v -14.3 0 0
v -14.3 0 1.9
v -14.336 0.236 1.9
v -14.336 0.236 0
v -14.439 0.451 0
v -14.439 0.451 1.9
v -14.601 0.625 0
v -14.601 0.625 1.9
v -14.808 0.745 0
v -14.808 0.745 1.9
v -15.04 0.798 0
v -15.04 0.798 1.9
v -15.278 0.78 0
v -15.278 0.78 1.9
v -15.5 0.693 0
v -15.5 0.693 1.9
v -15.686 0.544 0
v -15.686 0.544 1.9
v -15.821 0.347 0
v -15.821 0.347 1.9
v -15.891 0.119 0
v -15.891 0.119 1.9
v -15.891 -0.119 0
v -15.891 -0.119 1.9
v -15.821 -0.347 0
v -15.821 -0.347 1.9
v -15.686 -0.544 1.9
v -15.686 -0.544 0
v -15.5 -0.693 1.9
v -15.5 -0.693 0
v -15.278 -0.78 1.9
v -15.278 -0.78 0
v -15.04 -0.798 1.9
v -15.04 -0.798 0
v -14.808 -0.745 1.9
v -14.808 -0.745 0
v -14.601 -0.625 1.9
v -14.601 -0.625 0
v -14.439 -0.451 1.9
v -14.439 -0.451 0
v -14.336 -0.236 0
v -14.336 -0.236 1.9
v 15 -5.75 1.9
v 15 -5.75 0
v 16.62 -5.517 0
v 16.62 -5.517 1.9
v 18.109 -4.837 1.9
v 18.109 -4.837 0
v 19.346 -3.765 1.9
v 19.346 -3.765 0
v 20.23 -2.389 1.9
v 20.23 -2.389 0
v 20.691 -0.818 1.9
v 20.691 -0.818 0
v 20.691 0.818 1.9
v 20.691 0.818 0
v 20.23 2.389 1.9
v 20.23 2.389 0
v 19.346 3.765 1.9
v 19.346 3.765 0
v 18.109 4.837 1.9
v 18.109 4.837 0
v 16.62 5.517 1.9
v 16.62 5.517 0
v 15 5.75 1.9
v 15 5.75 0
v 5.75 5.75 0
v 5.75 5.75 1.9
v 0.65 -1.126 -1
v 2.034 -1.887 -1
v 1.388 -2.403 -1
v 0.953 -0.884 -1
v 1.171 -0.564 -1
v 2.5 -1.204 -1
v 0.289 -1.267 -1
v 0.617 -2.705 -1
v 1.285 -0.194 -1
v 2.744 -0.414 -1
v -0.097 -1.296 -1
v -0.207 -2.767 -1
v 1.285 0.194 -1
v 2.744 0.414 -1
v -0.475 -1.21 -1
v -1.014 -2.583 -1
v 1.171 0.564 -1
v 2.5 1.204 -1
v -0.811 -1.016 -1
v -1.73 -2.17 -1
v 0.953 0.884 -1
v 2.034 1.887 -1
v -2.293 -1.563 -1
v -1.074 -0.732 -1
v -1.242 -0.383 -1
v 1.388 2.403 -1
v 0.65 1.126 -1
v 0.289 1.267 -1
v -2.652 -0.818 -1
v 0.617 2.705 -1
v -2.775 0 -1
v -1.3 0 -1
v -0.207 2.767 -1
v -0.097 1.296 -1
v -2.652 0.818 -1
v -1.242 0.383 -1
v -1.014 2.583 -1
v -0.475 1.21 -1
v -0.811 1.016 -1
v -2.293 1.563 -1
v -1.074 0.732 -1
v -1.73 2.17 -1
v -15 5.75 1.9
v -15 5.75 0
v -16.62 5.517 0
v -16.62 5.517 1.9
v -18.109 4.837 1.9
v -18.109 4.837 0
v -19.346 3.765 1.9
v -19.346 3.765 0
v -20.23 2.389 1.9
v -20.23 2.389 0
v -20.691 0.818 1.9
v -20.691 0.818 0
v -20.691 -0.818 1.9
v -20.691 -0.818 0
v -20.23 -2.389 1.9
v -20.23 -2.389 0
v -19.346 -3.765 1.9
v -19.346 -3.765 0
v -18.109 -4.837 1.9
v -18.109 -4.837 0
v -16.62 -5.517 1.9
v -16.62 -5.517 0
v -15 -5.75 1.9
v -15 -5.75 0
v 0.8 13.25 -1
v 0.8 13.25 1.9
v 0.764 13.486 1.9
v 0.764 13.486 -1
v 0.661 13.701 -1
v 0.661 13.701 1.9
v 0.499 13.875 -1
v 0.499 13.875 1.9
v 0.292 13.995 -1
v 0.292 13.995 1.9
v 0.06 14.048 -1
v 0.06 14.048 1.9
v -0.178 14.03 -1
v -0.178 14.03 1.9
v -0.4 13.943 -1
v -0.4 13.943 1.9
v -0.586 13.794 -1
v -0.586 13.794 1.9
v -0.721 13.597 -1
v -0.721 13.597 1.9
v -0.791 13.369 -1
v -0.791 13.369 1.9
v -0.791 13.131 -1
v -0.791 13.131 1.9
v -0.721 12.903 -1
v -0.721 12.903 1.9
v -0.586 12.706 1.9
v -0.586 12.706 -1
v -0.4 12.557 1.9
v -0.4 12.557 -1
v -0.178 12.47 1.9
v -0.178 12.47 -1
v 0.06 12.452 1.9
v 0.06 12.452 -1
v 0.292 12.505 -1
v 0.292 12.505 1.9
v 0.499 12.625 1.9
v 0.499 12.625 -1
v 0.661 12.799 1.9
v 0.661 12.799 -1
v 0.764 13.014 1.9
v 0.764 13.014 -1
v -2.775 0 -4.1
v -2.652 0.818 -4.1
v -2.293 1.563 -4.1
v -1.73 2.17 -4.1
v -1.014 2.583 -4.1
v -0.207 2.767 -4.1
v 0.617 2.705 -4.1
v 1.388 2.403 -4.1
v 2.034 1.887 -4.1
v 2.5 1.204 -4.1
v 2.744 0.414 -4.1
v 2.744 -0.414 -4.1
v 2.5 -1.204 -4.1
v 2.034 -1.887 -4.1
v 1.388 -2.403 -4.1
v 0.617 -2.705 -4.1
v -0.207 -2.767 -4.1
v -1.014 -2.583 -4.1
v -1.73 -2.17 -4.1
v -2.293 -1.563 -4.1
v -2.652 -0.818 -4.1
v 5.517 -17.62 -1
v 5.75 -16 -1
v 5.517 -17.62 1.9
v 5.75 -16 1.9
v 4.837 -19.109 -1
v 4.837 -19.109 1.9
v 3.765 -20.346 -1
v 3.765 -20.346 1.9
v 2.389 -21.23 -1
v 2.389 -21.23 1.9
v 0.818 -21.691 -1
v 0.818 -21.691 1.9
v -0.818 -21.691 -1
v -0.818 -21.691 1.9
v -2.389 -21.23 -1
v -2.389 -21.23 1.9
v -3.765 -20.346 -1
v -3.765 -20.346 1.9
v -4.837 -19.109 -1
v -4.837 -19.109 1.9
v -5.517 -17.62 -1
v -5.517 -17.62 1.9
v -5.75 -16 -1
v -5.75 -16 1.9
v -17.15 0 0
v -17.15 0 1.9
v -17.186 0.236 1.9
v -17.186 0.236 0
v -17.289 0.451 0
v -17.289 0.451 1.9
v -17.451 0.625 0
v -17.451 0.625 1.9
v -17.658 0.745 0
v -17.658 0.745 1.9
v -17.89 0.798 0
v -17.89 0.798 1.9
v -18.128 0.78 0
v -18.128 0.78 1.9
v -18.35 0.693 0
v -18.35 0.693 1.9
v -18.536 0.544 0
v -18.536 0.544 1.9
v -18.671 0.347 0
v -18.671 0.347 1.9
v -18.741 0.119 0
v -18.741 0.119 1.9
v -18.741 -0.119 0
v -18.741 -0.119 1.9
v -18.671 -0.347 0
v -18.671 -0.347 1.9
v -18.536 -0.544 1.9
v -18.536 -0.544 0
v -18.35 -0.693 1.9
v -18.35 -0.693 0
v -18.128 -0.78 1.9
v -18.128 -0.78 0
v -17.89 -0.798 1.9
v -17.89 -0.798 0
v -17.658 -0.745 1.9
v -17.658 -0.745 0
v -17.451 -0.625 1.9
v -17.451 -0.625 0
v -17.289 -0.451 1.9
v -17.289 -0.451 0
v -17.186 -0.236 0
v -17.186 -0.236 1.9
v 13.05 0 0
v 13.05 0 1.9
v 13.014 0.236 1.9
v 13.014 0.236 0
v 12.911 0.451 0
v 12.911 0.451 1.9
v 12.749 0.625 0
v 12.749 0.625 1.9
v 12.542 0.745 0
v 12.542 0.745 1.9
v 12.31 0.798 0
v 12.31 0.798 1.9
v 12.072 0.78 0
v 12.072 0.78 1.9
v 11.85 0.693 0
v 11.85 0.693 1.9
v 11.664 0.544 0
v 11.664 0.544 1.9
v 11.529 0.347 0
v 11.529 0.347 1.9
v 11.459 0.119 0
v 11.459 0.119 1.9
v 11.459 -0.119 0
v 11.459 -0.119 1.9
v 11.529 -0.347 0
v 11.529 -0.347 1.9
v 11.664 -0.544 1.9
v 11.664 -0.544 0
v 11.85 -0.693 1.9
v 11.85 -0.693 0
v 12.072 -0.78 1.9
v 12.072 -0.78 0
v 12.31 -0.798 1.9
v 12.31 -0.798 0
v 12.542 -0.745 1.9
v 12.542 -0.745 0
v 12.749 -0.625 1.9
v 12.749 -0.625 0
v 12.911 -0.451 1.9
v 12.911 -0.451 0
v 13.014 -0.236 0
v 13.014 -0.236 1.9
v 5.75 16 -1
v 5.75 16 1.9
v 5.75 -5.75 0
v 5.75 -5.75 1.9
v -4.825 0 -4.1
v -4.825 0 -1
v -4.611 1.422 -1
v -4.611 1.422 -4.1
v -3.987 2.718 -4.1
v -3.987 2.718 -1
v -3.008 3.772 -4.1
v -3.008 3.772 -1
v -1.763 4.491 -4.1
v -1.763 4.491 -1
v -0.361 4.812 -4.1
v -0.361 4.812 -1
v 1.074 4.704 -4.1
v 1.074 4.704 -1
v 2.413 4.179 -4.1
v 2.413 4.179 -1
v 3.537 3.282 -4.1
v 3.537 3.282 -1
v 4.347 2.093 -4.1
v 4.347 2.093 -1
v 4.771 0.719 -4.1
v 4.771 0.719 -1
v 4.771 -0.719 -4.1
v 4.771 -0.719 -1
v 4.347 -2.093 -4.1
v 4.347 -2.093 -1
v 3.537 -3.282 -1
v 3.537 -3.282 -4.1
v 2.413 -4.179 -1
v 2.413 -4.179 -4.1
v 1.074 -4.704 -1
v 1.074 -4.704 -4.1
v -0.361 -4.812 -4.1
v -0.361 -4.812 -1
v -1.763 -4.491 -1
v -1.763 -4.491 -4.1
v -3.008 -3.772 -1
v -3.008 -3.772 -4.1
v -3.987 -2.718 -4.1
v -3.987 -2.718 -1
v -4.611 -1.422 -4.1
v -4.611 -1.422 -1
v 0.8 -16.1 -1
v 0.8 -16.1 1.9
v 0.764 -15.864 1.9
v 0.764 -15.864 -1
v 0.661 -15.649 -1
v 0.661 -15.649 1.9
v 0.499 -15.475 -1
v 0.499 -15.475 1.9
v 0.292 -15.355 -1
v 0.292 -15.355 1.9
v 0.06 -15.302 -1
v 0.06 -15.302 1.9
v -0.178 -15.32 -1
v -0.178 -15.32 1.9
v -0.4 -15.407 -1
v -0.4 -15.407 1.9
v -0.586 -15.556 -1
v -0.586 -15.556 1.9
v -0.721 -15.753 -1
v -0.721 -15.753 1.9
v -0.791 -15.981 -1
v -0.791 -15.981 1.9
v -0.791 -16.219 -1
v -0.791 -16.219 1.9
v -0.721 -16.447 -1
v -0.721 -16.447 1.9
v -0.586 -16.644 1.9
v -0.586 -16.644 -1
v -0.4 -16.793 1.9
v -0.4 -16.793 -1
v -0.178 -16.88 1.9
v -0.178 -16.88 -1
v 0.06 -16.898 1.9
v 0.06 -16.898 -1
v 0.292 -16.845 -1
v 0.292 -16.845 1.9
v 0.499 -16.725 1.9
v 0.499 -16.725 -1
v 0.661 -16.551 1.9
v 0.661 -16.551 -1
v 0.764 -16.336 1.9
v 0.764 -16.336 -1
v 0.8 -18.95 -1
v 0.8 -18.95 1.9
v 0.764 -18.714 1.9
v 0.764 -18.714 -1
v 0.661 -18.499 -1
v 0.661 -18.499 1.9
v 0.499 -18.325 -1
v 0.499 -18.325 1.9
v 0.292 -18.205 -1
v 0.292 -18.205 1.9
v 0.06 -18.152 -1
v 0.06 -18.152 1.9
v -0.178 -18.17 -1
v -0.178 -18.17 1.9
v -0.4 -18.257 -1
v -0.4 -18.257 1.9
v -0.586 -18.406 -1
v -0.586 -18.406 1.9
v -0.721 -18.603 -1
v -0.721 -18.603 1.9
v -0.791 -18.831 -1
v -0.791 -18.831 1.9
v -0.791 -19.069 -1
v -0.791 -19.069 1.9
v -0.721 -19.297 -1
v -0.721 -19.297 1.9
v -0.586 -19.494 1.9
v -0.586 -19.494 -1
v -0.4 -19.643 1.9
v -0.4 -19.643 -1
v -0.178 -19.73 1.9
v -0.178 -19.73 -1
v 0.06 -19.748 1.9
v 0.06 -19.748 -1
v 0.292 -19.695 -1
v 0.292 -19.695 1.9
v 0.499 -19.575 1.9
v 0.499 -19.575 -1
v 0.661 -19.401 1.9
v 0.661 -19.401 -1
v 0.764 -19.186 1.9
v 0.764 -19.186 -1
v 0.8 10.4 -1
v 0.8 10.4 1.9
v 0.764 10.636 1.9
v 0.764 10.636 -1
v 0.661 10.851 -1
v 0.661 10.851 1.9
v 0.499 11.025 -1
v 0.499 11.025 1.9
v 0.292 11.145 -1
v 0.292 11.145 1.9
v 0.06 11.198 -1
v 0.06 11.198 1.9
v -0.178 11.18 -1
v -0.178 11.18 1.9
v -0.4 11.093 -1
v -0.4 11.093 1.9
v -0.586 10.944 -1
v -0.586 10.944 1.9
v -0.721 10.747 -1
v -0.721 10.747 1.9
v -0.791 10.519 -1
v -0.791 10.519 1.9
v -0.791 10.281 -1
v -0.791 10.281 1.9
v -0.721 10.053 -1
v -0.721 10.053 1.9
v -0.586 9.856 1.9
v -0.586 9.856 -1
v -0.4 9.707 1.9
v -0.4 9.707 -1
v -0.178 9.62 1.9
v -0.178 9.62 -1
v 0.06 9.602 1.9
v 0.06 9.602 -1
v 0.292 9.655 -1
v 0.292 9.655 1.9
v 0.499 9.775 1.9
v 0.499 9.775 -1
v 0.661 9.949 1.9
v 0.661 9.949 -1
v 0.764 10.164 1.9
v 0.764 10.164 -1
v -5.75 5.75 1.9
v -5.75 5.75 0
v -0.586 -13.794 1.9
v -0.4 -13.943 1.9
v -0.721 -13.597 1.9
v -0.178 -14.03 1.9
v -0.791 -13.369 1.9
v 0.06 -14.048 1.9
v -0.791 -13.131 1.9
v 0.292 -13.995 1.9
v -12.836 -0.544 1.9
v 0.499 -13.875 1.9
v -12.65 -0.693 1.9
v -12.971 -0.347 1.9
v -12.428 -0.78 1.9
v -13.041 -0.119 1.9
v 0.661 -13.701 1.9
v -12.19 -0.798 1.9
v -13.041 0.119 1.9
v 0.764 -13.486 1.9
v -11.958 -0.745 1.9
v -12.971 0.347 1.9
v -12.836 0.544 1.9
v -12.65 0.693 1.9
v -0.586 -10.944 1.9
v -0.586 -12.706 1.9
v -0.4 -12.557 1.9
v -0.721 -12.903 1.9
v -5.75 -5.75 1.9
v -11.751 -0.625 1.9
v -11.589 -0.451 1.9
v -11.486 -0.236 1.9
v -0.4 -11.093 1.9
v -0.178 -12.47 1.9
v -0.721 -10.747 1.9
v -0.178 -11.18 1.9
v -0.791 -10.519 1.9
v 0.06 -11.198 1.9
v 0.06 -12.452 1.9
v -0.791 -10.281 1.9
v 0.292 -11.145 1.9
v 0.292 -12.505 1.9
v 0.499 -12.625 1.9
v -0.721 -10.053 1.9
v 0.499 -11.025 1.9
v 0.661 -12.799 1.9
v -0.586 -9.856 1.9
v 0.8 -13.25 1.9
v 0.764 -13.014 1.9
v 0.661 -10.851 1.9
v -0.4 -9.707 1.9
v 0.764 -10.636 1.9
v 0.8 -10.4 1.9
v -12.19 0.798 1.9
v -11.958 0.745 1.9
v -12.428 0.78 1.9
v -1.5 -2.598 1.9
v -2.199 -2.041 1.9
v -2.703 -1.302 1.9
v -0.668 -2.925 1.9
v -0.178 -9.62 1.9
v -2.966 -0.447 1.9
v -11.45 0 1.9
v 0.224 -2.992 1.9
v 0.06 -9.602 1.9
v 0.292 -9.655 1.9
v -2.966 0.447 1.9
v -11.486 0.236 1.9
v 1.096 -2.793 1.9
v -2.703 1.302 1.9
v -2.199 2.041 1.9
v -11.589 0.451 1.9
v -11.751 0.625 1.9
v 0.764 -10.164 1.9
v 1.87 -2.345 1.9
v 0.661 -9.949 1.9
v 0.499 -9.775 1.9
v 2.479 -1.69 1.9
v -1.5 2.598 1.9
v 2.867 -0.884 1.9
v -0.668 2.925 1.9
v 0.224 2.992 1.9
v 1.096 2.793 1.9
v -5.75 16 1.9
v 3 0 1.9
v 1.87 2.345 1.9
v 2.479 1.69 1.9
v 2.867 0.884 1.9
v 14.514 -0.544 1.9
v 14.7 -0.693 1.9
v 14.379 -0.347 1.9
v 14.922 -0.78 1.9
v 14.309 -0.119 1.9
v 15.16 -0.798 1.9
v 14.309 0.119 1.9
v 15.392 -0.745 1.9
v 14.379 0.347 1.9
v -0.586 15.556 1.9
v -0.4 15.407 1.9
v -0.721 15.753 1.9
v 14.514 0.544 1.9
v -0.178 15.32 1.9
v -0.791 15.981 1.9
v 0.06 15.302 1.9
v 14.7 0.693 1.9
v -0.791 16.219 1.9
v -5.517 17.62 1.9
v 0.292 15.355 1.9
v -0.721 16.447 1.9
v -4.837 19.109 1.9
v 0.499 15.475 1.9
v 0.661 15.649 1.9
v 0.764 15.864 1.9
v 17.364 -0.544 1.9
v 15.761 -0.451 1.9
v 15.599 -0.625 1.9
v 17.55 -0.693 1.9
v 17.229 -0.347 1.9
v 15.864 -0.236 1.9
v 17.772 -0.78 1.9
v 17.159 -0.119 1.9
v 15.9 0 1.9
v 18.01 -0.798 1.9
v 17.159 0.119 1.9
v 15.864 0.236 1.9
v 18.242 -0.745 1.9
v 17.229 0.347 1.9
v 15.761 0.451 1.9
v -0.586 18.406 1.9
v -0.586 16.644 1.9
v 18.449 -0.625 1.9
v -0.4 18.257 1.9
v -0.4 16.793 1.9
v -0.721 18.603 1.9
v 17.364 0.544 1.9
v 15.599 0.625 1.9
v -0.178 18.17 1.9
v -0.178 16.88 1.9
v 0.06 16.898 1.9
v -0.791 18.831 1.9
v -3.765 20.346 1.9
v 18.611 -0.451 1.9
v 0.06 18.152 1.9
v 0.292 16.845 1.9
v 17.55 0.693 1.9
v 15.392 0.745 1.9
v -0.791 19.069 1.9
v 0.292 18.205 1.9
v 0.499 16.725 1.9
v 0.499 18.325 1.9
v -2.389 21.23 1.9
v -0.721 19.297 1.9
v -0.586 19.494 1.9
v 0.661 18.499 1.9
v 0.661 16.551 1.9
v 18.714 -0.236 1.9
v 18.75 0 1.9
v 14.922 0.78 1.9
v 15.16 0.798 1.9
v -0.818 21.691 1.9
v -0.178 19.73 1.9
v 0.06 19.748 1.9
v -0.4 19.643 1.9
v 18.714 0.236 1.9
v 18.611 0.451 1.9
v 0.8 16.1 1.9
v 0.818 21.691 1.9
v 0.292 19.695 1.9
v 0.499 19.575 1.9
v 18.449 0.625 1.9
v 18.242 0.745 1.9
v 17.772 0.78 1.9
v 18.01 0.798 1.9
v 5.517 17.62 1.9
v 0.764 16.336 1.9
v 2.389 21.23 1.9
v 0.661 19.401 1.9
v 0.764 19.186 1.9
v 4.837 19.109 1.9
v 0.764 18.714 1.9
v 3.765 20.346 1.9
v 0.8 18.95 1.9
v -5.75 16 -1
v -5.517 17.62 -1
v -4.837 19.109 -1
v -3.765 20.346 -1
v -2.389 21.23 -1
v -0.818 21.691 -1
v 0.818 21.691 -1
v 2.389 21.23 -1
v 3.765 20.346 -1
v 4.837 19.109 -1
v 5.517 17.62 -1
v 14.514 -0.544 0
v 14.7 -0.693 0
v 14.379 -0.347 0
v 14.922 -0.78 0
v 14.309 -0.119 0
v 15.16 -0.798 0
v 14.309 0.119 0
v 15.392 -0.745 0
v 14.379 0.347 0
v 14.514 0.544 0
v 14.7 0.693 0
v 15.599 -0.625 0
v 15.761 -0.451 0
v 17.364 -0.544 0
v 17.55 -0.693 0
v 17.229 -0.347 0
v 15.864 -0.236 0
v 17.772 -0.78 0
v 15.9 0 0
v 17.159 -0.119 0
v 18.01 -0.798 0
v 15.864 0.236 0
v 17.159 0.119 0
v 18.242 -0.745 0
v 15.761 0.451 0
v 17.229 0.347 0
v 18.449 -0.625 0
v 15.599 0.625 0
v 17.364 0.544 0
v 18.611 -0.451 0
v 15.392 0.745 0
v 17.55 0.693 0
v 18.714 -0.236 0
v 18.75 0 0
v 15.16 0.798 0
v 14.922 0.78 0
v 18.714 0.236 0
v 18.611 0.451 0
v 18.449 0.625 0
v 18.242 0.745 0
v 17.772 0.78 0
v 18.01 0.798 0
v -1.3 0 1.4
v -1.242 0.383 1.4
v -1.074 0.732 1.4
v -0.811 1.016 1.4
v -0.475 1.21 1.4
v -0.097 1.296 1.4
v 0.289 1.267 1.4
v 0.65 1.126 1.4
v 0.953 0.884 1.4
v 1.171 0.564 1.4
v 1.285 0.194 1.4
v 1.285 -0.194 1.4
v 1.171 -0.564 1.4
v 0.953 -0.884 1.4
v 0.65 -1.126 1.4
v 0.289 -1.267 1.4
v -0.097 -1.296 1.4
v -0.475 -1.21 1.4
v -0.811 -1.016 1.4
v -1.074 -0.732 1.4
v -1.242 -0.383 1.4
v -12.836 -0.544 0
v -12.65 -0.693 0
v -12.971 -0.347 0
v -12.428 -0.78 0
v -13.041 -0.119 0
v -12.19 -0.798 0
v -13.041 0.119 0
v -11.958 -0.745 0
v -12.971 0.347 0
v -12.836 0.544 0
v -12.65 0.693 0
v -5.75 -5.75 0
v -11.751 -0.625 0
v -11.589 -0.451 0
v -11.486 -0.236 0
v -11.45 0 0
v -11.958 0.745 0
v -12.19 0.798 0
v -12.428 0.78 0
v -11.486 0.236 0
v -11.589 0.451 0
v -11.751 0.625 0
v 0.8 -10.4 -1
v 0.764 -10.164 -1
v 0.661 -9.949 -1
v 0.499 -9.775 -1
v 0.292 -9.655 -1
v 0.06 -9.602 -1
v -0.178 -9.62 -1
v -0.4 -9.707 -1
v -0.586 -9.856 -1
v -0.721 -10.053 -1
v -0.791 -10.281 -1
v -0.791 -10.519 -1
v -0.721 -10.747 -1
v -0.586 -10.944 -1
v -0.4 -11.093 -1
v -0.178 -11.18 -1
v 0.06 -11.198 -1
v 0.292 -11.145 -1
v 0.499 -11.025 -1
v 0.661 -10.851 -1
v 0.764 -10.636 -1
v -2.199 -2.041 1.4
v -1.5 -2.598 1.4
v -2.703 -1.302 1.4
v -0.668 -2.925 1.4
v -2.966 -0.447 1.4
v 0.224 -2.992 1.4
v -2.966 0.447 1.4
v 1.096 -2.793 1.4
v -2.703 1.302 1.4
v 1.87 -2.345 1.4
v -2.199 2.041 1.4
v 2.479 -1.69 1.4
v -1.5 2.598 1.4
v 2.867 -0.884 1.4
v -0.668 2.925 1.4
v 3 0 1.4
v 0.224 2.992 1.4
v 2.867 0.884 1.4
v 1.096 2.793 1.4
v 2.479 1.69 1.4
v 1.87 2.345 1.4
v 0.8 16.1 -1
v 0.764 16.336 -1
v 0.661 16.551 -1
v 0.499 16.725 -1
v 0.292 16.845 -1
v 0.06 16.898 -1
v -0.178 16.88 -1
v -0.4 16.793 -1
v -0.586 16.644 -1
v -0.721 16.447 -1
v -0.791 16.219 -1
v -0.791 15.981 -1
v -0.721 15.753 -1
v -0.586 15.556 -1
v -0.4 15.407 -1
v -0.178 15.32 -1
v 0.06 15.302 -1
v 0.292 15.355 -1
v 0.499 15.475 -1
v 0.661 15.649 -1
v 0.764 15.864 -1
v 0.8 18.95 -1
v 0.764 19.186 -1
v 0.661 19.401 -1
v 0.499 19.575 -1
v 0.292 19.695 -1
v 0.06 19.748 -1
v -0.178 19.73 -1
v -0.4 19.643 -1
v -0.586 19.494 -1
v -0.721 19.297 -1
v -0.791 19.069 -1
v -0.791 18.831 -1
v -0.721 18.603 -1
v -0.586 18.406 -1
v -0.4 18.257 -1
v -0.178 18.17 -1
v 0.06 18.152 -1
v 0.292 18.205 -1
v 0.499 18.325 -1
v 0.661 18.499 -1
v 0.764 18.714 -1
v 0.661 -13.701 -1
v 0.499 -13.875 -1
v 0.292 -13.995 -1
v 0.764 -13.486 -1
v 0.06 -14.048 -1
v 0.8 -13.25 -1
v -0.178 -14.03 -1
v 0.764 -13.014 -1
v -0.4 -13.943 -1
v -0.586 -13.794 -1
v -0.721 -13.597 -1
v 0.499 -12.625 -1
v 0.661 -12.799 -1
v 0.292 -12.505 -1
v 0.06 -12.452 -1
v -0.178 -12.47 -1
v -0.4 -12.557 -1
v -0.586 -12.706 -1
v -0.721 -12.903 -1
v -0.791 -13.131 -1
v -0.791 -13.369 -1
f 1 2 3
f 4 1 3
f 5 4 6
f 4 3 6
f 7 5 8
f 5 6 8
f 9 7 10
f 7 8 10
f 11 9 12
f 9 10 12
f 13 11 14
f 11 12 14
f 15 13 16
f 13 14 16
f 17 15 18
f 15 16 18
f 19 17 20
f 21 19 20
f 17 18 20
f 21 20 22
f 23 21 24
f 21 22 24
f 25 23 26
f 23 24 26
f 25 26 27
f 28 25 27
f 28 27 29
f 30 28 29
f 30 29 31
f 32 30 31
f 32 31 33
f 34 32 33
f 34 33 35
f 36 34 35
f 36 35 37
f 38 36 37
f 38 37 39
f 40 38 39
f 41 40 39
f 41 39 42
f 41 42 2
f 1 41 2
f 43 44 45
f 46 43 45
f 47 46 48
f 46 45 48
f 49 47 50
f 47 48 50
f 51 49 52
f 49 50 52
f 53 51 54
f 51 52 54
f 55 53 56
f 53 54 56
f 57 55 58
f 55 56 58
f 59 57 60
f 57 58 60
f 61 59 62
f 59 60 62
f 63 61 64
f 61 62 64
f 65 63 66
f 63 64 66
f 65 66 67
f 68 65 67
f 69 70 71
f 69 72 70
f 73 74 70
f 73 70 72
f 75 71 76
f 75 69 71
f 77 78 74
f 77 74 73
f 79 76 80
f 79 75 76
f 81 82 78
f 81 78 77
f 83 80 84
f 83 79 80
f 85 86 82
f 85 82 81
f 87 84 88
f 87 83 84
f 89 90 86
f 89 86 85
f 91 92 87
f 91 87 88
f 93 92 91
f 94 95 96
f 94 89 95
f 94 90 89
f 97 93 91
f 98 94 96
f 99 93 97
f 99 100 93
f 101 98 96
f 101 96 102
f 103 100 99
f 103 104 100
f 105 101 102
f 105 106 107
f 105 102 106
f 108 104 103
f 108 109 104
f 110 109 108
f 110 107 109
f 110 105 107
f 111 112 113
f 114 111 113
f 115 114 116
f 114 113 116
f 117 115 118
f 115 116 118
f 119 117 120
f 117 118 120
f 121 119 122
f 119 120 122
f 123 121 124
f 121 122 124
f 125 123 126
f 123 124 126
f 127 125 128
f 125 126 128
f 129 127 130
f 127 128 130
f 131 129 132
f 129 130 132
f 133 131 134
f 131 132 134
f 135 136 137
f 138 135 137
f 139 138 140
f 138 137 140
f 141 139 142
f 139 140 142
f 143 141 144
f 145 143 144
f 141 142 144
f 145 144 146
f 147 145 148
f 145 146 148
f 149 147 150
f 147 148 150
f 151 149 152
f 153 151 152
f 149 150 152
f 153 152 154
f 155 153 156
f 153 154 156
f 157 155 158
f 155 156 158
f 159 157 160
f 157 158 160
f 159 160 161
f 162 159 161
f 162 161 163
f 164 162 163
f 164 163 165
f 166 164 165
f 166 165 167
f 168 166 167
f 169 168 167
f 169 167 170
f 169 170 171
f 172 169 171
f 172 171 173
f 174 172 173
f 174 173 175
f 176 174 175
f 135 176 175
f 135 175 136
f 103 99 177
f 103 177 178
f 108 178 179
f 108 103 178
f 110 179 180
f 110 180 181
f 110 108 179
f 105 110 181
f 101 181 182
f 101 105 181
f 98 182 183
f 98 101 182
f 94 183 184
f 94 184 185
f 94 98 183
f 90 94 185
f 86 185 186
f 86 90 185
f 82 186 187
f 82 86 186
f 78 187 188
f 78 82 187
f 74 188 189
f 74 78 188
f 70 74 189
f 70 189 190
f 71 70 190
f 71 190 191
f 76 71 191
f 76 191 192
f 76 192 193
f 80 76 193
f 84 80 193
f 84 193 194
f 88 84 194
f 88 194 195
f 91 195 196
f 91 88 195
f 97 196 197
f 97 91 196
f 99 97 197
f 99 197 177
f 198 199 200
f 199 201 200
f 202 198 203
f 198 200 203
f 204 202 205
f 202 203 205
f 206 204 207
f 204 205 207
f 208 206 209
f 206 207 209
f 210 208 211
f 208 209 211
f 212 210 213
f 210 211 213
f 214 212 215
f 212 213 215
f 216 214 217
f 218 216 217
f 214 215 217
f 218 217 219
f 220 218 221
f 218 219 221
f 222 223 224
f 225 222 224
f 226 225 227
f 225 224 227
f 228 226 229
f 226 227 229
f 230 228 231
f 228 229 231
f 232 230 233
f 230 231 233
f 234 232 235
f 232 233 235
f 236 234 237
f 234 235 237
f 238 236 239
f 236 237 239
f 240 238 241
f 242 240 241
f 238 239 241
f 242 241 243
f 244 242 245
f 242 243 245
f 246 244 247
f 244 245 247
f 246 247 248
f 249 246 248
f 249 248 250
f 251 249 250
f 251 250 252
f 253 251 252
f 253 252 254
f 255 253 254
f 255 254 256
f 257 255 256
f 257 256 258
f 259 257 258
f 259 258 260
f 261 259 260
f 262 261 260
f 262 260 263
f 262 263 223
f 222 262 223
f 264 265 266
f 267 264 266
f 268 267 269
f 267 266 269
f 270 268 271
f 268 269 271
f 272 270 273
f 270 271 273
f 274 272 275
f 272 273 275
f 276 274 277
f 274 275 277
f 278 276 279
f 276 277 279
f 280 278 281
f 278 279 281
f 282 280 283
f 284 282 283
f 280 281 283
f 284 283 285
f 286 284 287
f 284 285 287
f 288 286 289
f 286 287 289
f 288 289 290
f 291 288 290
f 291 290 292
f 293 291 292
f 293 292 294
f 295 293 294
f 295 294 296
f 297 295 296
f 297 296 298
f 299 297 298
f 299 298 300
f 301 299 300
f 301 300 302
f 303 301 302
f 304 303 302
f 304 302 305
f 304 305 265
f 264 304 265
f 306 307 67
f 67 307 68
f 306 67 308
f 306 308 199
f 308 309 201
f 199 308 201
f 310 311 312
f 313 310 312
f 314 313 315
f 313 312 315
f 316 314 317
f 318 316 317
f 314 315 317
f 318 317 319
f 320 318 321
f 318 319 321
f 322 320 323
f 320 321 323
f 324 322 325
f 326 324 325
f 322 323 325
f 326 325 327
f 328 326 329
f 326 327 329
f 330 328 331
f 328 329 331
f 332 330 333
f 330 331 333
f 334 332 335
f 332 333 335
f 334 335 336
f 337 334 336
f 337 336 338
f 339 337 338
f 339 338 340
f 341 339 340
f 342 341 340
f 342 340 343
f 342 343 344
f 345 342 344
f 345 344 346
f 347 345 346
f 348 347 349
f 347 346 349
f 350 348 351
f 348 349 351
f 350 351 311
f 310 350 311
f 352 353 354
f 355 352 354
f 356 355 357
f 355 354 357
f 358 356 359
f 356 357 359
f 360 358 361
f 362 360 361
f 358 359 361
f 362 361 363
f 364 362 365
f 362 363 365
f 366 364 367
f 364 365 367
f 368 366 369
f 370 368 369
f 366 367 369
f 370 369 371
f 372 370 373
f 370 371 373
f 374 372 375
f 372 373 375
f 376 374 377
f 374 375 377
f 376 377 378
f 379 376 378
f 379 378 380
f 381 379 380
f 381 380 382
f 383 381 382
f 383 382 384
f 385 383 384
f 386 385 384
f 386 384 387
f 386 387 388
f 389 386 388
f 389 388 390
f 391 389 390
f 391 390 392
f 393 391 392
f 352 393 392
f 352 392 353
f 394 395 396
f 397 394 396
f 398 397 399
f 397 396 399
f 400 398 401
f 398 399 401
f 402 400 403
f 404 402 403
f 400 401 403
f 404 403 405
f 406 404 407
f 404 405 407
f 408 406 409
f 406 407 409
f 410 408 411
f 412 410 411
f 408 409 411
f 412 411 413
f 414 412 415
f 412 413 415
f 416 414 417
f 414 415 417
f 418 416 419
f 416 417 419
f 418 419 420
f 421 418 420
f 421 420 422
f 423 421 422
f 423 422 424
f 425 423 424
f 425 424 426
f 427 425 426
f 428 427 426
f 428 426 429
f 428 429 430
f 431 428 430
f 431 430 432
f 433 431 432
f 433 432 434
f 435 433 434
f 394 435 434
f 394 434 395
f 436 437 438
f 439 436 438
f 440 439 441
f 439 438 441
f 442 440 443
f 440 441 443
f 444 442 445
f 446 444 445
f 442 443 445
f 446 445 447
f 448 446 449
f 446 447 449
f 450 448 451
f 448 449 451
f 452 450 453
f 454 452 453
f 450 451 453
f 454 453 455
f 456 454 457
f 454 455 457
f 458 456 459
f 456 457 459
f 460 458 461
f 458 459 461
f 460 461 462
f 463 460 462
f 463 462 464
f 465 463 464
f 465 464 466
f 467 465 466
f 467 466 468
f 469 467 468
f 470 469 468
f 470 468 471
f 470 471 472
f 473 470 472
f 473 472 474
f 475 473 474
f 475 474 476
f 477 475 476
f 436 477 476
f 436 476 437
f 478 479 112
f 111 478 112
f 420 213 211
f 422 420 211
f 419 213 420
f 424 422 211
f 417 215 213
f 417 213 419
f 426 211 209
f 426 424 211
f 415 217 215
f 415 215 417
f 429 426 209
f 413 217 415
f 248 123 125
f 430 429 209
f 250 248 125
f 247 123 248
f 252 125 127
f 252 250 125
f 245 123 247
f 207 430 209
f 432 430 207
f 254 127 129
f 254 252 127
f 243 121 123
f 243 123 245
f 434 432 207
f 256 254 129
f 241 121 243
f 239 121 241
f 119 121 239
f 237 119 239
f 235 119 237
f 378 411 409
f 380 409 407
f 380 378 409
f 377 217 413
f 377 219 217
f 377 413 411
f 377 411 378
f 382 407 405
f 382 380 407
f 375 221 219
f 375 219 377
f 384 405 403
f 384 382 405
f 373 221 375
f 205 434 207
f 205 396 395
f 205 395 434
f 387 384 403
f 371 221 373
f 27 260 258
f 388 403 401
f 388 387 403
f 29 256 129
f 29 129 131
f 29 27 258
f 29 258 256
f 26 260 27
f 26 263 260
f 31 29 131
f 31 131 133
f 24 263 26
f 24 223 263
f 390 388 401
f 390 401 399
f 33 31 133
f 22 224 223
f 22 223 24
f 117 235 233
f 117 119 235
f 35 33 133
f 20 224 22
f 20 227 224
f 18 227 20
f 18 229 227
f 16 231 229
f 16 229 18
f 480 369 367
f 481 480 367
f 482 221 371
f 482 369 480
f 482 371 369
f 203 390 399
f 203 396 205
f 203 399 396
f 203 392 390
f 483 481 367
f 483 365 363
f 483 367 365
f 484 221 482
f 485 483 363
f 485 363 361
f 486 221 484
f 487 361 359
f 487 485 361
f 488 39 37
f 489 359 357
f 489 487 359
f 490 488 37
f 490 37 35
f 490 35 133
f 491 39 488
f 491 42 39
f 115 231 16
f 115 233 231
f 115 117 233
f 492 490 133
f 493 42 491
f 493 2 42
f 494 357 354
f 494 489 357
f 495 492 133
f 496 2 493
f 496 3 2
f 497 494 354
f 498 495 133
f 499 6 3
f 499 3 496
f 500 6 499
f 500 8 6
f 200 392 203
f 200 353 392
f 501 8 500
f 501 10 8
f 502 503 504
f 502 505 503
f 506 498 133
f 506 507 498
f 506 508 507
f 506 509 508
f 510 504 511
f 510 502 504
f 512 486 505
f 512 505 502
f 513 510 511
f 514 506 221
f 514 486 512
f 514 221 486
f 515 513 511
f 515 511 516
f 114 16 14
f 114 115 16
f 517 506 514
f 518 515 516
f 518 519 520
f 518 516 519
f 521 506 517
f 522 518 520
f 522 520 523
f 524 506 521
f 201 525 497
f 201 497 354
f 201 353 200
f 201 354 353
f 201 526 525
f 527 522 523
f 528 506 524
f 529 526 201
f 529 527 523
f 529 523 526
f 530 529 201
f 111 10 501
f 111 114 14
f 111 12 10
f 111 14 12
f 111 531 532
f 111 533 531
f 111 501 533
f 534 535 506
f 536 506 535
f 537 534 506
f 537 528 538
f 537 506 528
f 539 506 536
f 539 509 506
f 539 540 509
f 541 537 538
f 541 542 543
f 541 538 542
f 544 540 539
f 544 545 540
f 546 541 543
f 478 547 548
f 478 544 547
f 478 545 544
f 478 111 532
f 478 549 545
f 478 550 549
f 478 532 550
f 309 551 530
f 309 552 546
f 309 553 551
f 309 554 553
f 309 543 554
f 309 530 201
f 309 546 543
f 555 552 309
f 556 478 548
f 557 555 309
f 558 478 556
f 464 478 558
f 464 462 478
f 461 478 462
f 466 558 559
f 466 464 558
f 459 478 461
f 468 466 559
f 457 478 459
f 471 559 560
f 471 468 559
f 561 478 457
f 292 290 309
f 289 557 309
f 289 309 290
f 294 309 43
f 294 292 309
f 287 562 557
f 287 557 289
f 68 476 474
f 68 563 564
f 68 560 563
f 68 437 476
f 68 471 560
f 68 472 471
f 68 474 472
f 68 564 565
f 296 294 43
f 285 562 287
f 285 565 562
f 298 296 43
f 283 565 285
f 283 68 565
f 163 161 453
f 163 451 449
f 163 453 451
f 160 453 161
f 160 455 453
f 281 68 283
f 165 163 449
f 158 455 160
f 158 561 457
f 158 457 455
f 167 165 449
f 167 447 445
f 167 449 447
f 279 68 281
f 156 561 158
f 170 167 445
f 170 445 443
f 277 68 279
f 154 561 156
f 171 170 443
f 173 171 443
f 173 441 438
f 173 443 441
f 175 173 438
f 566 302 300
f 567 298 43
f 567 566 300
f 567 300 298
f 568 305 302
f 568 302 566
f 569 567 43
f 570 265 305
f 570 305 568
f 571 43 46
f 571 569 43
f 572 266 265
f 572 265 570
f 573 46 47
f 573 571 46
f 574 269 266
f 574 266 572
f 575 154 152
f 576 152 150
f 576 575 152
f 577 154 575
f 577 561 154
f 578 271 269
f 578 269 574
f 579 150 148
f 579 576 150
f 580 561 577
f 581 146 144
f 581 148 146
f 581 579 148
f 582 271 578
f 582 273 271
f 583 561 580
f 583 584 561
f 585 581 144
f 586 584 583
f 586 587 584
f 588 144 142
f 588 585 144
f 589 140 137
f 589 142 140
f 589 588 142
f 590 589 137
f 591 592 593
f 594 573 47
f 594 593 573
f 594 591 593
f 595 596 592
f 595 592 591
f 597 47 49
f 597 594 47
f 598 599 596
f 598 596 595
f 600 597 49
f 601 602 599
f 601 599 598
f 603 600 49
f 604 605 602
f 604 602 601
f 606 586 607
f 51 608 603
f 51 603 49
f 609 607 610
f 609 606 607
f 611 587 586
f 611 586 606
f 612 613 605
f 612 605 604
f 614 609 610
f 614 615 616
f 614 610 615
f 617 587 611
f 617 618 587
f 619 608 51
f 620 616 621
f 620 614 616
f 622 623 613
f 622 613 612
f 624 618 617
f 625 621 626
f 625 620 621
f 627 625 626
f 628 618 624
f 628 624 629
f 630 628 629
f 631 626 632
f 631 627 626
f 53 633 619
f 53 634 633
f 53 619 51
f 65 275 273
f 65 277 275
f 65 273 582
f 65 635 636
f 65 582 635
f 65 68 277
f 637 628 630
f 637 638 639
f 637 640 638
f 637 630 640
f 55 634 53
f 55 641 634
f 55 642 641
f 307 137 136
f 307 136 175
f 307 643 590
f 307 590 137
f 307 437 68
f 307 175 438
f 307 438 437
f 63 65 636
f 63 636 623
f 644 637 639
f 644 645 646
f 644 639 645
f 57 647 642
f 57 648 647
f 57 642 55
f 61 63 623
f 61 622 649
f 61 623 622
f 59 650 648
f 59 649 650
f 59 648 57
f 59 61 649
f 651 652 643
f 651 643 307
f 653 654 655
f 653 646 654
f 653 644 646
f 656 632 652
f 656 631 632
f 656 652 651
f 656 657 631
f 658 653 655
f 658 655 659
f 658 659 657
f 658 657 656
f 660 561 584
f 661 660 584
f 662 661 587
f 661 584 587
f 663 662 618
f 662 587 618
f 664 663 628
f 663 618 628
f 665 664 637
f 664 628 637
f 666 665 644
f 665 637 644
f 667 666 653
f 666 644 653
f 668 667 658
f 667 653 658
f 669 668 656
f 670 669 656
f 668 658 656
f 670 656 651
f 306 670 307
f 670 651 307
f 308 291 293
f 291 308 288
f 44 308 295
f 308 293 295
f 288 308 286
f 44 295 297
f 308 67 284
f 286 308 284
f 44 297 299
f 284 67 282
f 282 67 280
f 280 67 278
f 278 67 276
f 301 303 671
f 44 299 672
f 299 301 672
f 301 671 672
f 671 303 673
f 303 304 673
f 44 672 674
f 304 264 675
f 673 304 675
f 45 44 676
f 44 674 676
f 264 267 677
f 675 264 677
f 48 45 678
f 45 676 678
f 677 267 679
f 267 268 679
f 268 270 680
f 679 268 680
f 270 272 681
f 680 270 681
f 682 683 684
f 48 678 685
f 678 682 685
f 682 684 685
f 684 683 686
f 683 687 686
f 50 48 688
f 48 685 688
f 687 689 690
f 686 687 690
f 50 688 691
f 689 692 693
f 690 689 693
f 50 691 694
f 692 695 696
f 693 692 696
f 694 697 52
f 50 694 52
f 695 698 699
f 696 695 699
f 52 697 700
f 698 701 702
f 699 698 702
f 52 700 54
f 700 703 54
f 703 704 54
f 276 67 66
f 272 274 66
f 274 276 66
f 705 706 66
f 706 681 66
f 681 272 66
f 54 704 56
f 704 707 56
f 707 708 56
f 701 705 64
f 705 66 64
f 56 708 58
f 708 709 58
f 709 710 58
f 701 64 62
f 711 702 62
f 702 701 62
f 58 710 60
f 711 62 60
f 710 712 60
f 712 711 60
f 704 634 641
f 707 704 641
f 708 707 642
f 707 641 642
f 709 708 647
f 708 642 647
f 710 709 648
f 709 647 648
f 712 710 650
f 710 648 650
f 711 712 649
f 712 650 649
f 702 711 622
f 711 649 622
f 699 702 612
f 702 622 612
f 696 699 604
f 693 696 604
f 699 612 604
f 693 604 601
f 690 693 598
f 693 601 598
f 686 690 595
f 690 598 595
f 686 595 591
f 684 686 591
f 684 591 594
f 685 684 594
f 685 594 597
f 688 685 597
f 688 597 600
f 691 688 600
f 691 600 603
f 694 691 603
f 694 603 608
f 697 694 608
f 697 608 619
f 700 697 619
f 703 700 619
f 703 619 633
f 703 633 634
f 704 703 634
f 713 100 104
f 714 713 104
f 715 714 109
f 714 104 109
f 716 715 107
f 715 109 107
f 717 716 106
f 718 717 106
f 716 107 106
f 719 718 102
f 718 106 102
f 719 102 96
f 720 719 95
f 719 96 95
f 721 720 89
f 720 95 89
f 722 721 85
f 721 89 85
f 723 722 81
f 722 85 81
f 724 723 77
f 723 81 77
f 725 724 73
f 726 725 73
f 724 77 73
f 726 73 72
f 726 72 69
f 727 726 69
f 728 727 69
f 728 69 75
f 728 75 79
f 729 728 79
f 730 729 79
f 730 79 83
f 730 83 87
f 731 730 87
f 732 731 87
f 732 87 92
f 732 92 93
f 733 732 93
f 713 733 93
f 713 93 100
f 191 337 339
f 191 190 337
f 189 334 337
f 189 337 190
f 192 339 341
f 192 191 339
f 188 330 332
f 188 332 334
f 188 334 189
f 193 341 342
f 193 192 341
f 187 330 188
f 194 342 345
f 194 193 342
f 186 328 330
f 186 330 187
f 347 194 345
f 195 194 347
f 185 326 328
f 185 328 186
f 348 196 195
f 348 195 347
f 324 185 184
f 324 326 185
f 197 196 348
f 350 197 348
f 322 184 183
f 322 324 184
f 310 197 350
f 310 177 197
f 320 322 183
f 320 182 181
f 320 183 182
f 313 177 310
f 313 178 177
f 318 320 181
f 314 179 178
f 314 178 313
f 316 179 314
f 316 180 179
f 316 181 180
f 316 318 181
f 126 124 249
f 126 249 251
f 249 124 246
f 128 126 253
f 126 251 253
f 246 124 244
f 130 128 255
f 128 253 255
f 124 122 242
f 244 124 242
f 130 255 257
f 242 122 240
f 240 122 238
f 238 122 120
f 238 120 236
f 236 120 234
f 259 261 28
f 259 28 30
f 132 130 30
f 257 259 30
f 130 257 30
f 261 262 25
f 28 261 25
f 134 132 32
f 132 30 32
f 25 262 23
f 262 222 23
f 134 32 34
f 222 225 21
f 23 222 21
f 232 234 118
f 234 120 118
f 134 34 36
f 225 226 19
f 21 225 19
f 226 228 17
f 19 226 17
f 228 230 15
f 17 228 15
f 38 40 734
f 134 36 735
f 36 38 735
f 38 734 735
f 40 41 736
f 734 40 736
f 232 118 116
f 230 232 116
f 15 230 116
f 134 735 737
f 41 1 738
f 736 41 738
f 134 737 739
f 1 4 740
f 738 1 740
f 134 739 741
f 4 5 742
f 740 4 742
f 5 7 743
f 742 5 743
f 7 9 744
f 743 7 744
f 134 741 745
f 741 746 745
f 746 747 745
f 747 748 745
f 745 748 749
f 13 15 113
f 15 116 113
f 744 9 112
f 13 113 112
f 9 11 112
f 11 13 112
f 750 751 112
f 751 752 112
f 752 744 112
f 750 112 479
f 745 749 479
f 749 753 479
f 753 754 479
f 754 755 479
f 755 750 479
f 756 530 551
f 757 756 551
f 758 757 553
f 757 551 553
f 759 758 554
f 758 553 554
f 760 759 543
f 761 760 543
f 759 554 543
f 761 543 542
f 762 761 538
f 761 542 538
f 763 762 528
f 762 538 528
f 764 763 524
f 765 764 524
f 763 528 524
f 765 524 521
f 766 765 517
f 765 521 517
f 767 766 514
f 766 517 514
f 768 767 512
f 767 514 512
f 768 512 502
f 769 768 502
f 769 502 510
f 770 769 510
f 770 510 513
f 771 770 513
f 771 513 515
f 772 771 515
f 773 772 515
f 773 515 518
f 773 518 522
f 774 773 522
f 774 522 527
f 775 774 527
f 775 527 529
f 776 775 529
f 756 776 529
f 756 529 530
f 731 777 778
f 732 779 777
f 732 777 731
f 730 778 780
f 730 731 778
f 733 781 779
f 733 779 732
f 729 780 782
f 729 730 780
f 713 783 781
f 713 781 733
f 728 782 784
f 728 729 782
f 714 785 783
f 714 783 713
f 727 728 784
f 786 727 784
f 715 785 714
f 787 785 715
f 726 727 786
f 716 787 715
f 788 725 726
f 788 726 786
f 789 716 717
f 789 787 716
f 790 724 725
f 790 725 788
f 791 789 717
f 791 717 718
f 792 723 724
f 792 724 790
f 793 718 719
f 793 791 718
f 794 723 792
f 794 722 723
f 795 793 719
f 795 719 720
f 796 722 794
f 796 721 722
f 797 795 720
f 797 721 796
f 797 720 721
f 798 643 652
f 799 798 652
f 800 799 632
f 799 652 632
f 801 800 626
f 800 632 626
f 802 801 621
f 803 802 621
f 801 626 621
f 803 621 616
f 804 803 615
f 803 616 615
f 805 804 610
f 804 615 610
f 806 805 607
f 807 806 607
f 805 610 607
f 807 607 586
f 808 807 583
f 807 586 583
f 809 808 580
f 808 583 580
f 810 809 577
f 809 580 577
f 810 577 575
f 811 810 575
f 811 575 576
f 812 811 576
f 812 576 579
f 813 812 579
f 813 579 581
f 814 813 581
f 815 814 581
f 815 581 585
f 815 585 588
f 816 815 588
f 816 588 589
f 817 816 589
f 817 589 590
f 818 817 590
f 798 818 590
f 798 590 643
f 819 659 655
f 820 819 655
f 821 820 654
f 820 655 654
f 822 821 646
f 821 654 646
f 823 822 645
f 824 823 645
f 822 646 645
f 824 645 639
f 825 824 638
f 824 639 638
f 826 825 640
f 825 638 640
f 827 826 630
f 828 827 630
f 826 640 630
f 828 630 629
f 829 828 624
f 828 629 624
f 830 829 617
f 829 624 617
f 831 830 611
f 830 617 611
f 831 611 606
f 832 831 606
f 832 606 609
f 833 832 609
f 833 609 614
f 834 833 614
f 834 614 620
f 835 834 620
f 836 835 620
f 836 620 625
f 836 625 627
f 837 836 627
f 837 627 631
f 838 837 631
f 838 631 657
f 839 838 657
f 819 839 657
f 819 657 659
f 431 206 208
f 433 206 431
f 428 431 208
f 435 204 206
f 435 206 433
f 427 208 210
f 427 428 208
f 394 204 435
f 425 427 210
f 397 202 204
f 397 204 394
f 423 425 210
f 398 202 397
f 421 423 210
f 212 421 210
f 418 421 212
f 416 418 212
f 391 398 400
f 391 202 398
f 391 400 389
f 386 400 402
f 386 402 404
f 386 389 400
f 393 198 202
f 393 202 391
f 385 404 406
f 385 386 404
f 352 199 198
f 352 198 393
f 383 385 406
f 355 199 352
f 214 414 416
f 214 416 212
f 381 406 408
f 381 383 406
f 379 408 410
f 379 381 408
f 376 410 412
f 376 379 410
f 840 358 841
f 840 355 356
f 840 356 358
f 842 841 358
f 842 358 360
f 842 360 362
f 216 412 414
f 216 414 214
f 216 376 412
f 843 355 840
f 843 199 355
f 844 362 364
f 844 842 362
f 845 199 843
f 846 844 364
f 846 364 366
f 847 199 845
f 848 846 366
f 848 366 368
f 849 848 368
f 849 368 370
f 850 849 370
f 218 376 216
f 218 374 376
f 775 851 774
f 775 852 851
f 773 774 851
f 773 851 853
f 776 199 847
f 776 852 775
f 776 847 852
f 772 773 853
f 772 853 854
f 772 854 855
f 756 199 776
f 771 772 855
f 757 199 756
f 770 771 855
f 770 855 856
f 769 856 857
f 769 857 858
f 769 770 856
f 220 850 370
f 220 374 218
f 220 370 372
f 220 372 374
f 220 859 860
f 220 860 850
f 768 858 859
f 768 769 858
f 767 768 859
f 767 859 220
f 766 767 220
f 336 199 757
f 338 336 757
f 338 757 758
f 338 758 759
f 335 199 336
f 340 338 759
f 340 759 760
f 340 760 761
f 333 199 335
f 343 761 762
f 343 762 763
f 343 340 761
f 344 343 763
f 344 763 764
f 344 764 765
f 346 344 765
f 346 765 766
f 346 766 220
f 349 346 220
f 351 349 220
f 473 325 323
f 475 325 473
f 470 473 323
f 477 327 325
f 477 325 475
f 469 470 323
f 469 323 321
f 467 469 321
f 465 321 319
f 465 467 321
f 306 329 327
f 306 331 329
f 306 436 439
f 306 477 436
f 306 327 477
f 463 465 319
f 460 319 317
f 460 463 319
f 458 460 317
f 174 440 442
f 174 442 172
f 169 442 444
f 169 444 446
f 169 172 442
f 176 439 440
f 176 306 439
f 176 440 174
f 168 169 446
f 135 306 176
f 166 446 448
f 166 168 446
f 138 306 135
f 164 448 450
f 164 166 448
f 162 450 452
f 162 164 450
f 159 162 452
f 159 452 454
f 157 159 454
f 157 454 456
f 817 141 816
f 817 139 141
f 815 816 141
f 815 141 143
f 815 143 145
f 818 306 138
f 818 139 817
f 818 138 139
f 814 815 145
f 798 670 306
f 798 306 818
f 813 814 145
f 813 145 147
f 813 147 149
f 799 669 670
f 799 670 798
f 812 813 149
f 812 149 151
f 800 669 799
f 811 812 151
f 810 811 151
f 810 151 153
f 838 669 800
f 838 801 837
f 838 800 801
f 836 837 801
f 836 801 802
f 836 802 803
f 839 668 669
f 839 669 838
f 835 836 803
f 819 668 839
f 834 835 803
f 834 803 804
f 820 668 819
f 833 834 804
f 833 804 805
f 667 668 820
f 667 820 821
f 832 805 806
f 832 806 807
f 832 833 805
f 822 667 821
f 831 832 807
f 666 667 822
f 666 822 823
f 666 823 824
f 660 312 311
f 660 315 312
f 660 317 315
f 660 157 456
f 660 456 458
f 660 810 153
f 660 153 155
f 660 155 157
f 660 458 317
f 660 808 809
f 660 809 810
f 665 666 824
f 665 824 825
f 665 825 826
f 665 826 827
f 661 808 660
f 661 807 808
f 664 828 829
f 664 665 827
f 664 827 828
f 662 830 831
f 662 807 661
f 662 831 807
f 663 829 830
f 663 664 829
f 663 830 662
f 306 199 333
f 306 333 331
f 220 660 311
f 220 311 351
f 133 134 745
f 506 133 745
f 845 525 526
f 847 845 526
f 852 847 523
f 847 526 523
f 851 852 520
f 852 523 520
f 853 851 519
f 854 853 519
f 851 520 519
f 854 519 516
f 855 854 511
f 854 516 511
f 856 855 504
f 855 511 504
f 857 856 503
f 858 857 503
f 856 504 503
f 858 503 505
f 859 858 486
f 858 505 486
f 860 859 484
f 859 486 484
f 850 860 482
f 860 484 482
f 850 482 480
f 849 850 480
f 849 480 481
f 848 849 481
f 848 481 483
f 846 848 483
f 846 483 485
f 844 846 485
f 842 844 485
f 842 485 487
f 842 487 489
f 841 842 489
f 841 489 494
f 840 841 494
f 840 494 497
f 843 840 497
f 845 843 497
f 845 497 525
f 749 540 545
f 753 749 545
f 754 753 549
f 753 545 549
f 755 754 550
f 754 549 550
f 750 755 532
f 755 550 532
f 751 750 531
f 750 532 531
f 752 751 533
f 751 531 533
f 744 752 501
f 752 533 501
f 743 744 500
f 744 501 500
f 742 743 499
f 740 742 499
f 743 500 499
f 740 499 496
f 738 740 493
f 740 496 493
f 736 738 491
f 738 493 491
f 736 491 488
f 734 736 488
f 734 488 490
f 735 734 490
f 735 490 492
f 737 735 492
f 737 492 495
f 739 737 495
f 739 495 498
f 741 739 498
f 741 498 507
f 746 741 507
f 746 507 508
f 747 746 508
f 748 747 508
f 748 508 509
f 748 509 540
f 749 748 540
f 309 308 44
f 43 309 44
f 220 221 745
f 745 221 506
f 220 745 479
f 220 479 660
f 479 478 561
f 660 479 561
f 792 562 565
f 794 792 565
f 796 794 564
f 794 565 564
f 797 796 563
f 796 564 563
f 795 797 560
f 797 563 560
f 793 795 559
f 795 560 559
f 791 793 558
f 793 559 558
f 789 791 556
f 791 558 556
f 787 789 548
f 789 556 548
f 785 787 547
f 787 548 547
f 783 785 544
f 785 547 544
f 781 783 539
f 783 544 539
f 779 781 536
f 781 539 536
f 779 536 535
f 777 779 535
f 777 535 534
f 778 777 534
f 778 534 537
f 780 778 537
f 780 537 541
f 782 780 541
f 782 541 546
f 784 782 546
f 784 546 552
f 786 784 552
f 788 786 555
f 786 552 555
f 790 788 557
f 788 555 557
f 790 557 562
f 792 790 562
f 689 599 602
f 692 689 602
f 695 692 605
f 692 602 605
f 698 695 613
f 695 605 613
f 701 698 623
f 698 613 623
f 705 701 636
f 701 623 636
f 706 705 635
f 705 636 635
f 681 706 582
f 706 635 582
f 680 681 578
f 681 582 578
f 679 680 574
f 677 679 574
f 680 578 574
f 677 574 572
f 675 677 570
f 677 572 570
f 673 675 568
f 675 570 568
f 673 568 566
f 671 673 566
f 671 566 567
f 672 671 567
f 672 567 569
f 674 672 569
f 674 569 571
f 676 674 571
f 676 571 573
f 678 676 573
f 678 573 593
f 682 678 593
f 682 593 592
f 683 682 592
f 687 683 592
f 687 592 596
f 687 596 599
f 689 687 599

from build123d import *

# Parameters (mm, degrees)
BOSS_EXTRUDE1_DEPTH = 1.9
BOSS_EXTRUDE2_DEPTH = 1
SKETCH3_R           = 3
CUT_EXTRUDE1_DEPTH  = 0.5
SKETCH4_R           = 4.825
SKETCH4_R_2         = 2.775
BOSS_EXTRUDE3_DEPTH = 3.1
SKETCH5_R           = 1.3
CUT_EXTRUDE2_DEPTH  = 3.9
SKETCH6_R           = 0.8
CUT_EXTRUDE4_DEPTH  = 7


with BuildPart() as part:
    # Sketch1 → Boss-Extrude1 (new body)
    with BuildSketch(Plane.XY):
        with BuildLine():
            Line((-5.75, 16), (-5.75, 5.75))
            Line((-5.75, 5.75), (-15, 5.75))
            ThreePointArc((-15, 5.75), (-20.75, 0), (-15, -5.75))
            Line((-15, -5.75), (-5.75, -5.75))
            Line((-5.75, -5.75), (-5.75, -16))
            ThreePointArc((-5.75, -16), (0, -21.75), (5.75, -16))
            Line((5.75, -16), (5.75, -5.75))
            Line((5.75, -5.75), (15, -5.75))
            ThreePointArc((15, -5.75), (20.75, 0), (15, 5.75))
            Line((15, 5.75), (5.75, 5.75))
            Line((5.75, 5.75), (5.75, 16))
            ThreePointArc((5.75, 16), (0, 21.75), (-5.75, 16))
        make_face()
    extrude(amount=BOSS_EXTRUDE1_DEPTH)

    # Sketch2 → Boss-Extrude2 (add)
    with BuildSketch(Plane(origin=(0, 0, 0), x_dir=(-1, 0, 0), z_dir=(0, 0, -1))):
        with BuildLine():
            Line((-5.75, 16), (-5.75, -16))
            ThreePointArc((-5.75, -16), (0, -21.75), (5.75, -16))
            Line((5.75, -16), (5.75, -5.75))
            Line((5.75, -5.75), (5.75, 5.75))
            Line((5.75, 5.75), (5.75, 16))
            ThreePointArc((5.75, 16), (0, 21.75), (-5.75, 16))
        make_face()
    extrude(amount=BOSS_EXTRUDE2_DEPTH)

    # Sketch3 → Cut-Extrude1 (cut)
    with BuildSketch(Plane.XY.offset(1.9)):
        Circle(SKETCH3_R)
    extrude(amount=-CUT_EXTRUDE1_DEPTH, mode=Mode.SUBTRACT)

    # Sketch4 → Boss-Extrude3 (add)
    with BuildSketch(Plane(origin=(0, 0, -1), x_dir=(-1, 0, 0), z_dir=(0, 0, -1))):
        Circle(SKETCH4_R)
        Circle(SKETCH4_R_2, mode=Mode.SUBTRACT)
    extrude(amount=BOSS_EXTRUDE3_DEPTH)

    # Sketch5 → Cut-Extrude2 (cut, through all)
    with BuildSketch(Plane(origin=(0, 0, -1), x_dir=(-1, 0, 0), z_dir=(0, 0, -1))):
        Circle(SKETCH5_R)
    extrude(amount=-CUT_EXTRUDE2_DEPTH, mode=Mode.SUBTRACT)

    # Sketch6 → Cut-Extrude4 (cut, through all)
    with BuildSketch(Plane.XY.offset(1.9)):
        with Locations((-17.95, 0)):
            Circle(SKETCH6_R)
        with Locations((-15.1, 0)):
            Circle(SKETCH6_R)
        with Locations((-12.25, 0)):
            Circle(SKETCH6_R)
        with Locations((0, 18.95)):
            Circle(SKETCH6_R)
        with Locations((0, 16.1)):
            Circle(SKETCH6_R)
        with Locations((0, 13.25)):
            Circle(SKETCH6_R)
        with Locations((12.25, 0)):
            Circle(SKETCH6_R)
        with Locations((15.1, 0)):
            Circle(SKETCH6_R)
        with Locations((17.95, 0)):
            Circle(SKETCH6_R)
        with Locations((0, -10.4)):
            Circle(SKETCH6_R)
        with Locations((0, -13.25)):
            Circle(SKETCH6_R)
        with Locations((0, -16.1)):
            Circle(SKETCH6_R)
        with Locations((0, -18.95)):
            Circle(SKETCH6_R)
        with Locations((0, 10.4)):
            Circle(SKETCH6_R)
    extrude(amount=-CUT_EXTRUDE4_DEPTH, mode=Mode.SUBTRACT)


solid = part.part
